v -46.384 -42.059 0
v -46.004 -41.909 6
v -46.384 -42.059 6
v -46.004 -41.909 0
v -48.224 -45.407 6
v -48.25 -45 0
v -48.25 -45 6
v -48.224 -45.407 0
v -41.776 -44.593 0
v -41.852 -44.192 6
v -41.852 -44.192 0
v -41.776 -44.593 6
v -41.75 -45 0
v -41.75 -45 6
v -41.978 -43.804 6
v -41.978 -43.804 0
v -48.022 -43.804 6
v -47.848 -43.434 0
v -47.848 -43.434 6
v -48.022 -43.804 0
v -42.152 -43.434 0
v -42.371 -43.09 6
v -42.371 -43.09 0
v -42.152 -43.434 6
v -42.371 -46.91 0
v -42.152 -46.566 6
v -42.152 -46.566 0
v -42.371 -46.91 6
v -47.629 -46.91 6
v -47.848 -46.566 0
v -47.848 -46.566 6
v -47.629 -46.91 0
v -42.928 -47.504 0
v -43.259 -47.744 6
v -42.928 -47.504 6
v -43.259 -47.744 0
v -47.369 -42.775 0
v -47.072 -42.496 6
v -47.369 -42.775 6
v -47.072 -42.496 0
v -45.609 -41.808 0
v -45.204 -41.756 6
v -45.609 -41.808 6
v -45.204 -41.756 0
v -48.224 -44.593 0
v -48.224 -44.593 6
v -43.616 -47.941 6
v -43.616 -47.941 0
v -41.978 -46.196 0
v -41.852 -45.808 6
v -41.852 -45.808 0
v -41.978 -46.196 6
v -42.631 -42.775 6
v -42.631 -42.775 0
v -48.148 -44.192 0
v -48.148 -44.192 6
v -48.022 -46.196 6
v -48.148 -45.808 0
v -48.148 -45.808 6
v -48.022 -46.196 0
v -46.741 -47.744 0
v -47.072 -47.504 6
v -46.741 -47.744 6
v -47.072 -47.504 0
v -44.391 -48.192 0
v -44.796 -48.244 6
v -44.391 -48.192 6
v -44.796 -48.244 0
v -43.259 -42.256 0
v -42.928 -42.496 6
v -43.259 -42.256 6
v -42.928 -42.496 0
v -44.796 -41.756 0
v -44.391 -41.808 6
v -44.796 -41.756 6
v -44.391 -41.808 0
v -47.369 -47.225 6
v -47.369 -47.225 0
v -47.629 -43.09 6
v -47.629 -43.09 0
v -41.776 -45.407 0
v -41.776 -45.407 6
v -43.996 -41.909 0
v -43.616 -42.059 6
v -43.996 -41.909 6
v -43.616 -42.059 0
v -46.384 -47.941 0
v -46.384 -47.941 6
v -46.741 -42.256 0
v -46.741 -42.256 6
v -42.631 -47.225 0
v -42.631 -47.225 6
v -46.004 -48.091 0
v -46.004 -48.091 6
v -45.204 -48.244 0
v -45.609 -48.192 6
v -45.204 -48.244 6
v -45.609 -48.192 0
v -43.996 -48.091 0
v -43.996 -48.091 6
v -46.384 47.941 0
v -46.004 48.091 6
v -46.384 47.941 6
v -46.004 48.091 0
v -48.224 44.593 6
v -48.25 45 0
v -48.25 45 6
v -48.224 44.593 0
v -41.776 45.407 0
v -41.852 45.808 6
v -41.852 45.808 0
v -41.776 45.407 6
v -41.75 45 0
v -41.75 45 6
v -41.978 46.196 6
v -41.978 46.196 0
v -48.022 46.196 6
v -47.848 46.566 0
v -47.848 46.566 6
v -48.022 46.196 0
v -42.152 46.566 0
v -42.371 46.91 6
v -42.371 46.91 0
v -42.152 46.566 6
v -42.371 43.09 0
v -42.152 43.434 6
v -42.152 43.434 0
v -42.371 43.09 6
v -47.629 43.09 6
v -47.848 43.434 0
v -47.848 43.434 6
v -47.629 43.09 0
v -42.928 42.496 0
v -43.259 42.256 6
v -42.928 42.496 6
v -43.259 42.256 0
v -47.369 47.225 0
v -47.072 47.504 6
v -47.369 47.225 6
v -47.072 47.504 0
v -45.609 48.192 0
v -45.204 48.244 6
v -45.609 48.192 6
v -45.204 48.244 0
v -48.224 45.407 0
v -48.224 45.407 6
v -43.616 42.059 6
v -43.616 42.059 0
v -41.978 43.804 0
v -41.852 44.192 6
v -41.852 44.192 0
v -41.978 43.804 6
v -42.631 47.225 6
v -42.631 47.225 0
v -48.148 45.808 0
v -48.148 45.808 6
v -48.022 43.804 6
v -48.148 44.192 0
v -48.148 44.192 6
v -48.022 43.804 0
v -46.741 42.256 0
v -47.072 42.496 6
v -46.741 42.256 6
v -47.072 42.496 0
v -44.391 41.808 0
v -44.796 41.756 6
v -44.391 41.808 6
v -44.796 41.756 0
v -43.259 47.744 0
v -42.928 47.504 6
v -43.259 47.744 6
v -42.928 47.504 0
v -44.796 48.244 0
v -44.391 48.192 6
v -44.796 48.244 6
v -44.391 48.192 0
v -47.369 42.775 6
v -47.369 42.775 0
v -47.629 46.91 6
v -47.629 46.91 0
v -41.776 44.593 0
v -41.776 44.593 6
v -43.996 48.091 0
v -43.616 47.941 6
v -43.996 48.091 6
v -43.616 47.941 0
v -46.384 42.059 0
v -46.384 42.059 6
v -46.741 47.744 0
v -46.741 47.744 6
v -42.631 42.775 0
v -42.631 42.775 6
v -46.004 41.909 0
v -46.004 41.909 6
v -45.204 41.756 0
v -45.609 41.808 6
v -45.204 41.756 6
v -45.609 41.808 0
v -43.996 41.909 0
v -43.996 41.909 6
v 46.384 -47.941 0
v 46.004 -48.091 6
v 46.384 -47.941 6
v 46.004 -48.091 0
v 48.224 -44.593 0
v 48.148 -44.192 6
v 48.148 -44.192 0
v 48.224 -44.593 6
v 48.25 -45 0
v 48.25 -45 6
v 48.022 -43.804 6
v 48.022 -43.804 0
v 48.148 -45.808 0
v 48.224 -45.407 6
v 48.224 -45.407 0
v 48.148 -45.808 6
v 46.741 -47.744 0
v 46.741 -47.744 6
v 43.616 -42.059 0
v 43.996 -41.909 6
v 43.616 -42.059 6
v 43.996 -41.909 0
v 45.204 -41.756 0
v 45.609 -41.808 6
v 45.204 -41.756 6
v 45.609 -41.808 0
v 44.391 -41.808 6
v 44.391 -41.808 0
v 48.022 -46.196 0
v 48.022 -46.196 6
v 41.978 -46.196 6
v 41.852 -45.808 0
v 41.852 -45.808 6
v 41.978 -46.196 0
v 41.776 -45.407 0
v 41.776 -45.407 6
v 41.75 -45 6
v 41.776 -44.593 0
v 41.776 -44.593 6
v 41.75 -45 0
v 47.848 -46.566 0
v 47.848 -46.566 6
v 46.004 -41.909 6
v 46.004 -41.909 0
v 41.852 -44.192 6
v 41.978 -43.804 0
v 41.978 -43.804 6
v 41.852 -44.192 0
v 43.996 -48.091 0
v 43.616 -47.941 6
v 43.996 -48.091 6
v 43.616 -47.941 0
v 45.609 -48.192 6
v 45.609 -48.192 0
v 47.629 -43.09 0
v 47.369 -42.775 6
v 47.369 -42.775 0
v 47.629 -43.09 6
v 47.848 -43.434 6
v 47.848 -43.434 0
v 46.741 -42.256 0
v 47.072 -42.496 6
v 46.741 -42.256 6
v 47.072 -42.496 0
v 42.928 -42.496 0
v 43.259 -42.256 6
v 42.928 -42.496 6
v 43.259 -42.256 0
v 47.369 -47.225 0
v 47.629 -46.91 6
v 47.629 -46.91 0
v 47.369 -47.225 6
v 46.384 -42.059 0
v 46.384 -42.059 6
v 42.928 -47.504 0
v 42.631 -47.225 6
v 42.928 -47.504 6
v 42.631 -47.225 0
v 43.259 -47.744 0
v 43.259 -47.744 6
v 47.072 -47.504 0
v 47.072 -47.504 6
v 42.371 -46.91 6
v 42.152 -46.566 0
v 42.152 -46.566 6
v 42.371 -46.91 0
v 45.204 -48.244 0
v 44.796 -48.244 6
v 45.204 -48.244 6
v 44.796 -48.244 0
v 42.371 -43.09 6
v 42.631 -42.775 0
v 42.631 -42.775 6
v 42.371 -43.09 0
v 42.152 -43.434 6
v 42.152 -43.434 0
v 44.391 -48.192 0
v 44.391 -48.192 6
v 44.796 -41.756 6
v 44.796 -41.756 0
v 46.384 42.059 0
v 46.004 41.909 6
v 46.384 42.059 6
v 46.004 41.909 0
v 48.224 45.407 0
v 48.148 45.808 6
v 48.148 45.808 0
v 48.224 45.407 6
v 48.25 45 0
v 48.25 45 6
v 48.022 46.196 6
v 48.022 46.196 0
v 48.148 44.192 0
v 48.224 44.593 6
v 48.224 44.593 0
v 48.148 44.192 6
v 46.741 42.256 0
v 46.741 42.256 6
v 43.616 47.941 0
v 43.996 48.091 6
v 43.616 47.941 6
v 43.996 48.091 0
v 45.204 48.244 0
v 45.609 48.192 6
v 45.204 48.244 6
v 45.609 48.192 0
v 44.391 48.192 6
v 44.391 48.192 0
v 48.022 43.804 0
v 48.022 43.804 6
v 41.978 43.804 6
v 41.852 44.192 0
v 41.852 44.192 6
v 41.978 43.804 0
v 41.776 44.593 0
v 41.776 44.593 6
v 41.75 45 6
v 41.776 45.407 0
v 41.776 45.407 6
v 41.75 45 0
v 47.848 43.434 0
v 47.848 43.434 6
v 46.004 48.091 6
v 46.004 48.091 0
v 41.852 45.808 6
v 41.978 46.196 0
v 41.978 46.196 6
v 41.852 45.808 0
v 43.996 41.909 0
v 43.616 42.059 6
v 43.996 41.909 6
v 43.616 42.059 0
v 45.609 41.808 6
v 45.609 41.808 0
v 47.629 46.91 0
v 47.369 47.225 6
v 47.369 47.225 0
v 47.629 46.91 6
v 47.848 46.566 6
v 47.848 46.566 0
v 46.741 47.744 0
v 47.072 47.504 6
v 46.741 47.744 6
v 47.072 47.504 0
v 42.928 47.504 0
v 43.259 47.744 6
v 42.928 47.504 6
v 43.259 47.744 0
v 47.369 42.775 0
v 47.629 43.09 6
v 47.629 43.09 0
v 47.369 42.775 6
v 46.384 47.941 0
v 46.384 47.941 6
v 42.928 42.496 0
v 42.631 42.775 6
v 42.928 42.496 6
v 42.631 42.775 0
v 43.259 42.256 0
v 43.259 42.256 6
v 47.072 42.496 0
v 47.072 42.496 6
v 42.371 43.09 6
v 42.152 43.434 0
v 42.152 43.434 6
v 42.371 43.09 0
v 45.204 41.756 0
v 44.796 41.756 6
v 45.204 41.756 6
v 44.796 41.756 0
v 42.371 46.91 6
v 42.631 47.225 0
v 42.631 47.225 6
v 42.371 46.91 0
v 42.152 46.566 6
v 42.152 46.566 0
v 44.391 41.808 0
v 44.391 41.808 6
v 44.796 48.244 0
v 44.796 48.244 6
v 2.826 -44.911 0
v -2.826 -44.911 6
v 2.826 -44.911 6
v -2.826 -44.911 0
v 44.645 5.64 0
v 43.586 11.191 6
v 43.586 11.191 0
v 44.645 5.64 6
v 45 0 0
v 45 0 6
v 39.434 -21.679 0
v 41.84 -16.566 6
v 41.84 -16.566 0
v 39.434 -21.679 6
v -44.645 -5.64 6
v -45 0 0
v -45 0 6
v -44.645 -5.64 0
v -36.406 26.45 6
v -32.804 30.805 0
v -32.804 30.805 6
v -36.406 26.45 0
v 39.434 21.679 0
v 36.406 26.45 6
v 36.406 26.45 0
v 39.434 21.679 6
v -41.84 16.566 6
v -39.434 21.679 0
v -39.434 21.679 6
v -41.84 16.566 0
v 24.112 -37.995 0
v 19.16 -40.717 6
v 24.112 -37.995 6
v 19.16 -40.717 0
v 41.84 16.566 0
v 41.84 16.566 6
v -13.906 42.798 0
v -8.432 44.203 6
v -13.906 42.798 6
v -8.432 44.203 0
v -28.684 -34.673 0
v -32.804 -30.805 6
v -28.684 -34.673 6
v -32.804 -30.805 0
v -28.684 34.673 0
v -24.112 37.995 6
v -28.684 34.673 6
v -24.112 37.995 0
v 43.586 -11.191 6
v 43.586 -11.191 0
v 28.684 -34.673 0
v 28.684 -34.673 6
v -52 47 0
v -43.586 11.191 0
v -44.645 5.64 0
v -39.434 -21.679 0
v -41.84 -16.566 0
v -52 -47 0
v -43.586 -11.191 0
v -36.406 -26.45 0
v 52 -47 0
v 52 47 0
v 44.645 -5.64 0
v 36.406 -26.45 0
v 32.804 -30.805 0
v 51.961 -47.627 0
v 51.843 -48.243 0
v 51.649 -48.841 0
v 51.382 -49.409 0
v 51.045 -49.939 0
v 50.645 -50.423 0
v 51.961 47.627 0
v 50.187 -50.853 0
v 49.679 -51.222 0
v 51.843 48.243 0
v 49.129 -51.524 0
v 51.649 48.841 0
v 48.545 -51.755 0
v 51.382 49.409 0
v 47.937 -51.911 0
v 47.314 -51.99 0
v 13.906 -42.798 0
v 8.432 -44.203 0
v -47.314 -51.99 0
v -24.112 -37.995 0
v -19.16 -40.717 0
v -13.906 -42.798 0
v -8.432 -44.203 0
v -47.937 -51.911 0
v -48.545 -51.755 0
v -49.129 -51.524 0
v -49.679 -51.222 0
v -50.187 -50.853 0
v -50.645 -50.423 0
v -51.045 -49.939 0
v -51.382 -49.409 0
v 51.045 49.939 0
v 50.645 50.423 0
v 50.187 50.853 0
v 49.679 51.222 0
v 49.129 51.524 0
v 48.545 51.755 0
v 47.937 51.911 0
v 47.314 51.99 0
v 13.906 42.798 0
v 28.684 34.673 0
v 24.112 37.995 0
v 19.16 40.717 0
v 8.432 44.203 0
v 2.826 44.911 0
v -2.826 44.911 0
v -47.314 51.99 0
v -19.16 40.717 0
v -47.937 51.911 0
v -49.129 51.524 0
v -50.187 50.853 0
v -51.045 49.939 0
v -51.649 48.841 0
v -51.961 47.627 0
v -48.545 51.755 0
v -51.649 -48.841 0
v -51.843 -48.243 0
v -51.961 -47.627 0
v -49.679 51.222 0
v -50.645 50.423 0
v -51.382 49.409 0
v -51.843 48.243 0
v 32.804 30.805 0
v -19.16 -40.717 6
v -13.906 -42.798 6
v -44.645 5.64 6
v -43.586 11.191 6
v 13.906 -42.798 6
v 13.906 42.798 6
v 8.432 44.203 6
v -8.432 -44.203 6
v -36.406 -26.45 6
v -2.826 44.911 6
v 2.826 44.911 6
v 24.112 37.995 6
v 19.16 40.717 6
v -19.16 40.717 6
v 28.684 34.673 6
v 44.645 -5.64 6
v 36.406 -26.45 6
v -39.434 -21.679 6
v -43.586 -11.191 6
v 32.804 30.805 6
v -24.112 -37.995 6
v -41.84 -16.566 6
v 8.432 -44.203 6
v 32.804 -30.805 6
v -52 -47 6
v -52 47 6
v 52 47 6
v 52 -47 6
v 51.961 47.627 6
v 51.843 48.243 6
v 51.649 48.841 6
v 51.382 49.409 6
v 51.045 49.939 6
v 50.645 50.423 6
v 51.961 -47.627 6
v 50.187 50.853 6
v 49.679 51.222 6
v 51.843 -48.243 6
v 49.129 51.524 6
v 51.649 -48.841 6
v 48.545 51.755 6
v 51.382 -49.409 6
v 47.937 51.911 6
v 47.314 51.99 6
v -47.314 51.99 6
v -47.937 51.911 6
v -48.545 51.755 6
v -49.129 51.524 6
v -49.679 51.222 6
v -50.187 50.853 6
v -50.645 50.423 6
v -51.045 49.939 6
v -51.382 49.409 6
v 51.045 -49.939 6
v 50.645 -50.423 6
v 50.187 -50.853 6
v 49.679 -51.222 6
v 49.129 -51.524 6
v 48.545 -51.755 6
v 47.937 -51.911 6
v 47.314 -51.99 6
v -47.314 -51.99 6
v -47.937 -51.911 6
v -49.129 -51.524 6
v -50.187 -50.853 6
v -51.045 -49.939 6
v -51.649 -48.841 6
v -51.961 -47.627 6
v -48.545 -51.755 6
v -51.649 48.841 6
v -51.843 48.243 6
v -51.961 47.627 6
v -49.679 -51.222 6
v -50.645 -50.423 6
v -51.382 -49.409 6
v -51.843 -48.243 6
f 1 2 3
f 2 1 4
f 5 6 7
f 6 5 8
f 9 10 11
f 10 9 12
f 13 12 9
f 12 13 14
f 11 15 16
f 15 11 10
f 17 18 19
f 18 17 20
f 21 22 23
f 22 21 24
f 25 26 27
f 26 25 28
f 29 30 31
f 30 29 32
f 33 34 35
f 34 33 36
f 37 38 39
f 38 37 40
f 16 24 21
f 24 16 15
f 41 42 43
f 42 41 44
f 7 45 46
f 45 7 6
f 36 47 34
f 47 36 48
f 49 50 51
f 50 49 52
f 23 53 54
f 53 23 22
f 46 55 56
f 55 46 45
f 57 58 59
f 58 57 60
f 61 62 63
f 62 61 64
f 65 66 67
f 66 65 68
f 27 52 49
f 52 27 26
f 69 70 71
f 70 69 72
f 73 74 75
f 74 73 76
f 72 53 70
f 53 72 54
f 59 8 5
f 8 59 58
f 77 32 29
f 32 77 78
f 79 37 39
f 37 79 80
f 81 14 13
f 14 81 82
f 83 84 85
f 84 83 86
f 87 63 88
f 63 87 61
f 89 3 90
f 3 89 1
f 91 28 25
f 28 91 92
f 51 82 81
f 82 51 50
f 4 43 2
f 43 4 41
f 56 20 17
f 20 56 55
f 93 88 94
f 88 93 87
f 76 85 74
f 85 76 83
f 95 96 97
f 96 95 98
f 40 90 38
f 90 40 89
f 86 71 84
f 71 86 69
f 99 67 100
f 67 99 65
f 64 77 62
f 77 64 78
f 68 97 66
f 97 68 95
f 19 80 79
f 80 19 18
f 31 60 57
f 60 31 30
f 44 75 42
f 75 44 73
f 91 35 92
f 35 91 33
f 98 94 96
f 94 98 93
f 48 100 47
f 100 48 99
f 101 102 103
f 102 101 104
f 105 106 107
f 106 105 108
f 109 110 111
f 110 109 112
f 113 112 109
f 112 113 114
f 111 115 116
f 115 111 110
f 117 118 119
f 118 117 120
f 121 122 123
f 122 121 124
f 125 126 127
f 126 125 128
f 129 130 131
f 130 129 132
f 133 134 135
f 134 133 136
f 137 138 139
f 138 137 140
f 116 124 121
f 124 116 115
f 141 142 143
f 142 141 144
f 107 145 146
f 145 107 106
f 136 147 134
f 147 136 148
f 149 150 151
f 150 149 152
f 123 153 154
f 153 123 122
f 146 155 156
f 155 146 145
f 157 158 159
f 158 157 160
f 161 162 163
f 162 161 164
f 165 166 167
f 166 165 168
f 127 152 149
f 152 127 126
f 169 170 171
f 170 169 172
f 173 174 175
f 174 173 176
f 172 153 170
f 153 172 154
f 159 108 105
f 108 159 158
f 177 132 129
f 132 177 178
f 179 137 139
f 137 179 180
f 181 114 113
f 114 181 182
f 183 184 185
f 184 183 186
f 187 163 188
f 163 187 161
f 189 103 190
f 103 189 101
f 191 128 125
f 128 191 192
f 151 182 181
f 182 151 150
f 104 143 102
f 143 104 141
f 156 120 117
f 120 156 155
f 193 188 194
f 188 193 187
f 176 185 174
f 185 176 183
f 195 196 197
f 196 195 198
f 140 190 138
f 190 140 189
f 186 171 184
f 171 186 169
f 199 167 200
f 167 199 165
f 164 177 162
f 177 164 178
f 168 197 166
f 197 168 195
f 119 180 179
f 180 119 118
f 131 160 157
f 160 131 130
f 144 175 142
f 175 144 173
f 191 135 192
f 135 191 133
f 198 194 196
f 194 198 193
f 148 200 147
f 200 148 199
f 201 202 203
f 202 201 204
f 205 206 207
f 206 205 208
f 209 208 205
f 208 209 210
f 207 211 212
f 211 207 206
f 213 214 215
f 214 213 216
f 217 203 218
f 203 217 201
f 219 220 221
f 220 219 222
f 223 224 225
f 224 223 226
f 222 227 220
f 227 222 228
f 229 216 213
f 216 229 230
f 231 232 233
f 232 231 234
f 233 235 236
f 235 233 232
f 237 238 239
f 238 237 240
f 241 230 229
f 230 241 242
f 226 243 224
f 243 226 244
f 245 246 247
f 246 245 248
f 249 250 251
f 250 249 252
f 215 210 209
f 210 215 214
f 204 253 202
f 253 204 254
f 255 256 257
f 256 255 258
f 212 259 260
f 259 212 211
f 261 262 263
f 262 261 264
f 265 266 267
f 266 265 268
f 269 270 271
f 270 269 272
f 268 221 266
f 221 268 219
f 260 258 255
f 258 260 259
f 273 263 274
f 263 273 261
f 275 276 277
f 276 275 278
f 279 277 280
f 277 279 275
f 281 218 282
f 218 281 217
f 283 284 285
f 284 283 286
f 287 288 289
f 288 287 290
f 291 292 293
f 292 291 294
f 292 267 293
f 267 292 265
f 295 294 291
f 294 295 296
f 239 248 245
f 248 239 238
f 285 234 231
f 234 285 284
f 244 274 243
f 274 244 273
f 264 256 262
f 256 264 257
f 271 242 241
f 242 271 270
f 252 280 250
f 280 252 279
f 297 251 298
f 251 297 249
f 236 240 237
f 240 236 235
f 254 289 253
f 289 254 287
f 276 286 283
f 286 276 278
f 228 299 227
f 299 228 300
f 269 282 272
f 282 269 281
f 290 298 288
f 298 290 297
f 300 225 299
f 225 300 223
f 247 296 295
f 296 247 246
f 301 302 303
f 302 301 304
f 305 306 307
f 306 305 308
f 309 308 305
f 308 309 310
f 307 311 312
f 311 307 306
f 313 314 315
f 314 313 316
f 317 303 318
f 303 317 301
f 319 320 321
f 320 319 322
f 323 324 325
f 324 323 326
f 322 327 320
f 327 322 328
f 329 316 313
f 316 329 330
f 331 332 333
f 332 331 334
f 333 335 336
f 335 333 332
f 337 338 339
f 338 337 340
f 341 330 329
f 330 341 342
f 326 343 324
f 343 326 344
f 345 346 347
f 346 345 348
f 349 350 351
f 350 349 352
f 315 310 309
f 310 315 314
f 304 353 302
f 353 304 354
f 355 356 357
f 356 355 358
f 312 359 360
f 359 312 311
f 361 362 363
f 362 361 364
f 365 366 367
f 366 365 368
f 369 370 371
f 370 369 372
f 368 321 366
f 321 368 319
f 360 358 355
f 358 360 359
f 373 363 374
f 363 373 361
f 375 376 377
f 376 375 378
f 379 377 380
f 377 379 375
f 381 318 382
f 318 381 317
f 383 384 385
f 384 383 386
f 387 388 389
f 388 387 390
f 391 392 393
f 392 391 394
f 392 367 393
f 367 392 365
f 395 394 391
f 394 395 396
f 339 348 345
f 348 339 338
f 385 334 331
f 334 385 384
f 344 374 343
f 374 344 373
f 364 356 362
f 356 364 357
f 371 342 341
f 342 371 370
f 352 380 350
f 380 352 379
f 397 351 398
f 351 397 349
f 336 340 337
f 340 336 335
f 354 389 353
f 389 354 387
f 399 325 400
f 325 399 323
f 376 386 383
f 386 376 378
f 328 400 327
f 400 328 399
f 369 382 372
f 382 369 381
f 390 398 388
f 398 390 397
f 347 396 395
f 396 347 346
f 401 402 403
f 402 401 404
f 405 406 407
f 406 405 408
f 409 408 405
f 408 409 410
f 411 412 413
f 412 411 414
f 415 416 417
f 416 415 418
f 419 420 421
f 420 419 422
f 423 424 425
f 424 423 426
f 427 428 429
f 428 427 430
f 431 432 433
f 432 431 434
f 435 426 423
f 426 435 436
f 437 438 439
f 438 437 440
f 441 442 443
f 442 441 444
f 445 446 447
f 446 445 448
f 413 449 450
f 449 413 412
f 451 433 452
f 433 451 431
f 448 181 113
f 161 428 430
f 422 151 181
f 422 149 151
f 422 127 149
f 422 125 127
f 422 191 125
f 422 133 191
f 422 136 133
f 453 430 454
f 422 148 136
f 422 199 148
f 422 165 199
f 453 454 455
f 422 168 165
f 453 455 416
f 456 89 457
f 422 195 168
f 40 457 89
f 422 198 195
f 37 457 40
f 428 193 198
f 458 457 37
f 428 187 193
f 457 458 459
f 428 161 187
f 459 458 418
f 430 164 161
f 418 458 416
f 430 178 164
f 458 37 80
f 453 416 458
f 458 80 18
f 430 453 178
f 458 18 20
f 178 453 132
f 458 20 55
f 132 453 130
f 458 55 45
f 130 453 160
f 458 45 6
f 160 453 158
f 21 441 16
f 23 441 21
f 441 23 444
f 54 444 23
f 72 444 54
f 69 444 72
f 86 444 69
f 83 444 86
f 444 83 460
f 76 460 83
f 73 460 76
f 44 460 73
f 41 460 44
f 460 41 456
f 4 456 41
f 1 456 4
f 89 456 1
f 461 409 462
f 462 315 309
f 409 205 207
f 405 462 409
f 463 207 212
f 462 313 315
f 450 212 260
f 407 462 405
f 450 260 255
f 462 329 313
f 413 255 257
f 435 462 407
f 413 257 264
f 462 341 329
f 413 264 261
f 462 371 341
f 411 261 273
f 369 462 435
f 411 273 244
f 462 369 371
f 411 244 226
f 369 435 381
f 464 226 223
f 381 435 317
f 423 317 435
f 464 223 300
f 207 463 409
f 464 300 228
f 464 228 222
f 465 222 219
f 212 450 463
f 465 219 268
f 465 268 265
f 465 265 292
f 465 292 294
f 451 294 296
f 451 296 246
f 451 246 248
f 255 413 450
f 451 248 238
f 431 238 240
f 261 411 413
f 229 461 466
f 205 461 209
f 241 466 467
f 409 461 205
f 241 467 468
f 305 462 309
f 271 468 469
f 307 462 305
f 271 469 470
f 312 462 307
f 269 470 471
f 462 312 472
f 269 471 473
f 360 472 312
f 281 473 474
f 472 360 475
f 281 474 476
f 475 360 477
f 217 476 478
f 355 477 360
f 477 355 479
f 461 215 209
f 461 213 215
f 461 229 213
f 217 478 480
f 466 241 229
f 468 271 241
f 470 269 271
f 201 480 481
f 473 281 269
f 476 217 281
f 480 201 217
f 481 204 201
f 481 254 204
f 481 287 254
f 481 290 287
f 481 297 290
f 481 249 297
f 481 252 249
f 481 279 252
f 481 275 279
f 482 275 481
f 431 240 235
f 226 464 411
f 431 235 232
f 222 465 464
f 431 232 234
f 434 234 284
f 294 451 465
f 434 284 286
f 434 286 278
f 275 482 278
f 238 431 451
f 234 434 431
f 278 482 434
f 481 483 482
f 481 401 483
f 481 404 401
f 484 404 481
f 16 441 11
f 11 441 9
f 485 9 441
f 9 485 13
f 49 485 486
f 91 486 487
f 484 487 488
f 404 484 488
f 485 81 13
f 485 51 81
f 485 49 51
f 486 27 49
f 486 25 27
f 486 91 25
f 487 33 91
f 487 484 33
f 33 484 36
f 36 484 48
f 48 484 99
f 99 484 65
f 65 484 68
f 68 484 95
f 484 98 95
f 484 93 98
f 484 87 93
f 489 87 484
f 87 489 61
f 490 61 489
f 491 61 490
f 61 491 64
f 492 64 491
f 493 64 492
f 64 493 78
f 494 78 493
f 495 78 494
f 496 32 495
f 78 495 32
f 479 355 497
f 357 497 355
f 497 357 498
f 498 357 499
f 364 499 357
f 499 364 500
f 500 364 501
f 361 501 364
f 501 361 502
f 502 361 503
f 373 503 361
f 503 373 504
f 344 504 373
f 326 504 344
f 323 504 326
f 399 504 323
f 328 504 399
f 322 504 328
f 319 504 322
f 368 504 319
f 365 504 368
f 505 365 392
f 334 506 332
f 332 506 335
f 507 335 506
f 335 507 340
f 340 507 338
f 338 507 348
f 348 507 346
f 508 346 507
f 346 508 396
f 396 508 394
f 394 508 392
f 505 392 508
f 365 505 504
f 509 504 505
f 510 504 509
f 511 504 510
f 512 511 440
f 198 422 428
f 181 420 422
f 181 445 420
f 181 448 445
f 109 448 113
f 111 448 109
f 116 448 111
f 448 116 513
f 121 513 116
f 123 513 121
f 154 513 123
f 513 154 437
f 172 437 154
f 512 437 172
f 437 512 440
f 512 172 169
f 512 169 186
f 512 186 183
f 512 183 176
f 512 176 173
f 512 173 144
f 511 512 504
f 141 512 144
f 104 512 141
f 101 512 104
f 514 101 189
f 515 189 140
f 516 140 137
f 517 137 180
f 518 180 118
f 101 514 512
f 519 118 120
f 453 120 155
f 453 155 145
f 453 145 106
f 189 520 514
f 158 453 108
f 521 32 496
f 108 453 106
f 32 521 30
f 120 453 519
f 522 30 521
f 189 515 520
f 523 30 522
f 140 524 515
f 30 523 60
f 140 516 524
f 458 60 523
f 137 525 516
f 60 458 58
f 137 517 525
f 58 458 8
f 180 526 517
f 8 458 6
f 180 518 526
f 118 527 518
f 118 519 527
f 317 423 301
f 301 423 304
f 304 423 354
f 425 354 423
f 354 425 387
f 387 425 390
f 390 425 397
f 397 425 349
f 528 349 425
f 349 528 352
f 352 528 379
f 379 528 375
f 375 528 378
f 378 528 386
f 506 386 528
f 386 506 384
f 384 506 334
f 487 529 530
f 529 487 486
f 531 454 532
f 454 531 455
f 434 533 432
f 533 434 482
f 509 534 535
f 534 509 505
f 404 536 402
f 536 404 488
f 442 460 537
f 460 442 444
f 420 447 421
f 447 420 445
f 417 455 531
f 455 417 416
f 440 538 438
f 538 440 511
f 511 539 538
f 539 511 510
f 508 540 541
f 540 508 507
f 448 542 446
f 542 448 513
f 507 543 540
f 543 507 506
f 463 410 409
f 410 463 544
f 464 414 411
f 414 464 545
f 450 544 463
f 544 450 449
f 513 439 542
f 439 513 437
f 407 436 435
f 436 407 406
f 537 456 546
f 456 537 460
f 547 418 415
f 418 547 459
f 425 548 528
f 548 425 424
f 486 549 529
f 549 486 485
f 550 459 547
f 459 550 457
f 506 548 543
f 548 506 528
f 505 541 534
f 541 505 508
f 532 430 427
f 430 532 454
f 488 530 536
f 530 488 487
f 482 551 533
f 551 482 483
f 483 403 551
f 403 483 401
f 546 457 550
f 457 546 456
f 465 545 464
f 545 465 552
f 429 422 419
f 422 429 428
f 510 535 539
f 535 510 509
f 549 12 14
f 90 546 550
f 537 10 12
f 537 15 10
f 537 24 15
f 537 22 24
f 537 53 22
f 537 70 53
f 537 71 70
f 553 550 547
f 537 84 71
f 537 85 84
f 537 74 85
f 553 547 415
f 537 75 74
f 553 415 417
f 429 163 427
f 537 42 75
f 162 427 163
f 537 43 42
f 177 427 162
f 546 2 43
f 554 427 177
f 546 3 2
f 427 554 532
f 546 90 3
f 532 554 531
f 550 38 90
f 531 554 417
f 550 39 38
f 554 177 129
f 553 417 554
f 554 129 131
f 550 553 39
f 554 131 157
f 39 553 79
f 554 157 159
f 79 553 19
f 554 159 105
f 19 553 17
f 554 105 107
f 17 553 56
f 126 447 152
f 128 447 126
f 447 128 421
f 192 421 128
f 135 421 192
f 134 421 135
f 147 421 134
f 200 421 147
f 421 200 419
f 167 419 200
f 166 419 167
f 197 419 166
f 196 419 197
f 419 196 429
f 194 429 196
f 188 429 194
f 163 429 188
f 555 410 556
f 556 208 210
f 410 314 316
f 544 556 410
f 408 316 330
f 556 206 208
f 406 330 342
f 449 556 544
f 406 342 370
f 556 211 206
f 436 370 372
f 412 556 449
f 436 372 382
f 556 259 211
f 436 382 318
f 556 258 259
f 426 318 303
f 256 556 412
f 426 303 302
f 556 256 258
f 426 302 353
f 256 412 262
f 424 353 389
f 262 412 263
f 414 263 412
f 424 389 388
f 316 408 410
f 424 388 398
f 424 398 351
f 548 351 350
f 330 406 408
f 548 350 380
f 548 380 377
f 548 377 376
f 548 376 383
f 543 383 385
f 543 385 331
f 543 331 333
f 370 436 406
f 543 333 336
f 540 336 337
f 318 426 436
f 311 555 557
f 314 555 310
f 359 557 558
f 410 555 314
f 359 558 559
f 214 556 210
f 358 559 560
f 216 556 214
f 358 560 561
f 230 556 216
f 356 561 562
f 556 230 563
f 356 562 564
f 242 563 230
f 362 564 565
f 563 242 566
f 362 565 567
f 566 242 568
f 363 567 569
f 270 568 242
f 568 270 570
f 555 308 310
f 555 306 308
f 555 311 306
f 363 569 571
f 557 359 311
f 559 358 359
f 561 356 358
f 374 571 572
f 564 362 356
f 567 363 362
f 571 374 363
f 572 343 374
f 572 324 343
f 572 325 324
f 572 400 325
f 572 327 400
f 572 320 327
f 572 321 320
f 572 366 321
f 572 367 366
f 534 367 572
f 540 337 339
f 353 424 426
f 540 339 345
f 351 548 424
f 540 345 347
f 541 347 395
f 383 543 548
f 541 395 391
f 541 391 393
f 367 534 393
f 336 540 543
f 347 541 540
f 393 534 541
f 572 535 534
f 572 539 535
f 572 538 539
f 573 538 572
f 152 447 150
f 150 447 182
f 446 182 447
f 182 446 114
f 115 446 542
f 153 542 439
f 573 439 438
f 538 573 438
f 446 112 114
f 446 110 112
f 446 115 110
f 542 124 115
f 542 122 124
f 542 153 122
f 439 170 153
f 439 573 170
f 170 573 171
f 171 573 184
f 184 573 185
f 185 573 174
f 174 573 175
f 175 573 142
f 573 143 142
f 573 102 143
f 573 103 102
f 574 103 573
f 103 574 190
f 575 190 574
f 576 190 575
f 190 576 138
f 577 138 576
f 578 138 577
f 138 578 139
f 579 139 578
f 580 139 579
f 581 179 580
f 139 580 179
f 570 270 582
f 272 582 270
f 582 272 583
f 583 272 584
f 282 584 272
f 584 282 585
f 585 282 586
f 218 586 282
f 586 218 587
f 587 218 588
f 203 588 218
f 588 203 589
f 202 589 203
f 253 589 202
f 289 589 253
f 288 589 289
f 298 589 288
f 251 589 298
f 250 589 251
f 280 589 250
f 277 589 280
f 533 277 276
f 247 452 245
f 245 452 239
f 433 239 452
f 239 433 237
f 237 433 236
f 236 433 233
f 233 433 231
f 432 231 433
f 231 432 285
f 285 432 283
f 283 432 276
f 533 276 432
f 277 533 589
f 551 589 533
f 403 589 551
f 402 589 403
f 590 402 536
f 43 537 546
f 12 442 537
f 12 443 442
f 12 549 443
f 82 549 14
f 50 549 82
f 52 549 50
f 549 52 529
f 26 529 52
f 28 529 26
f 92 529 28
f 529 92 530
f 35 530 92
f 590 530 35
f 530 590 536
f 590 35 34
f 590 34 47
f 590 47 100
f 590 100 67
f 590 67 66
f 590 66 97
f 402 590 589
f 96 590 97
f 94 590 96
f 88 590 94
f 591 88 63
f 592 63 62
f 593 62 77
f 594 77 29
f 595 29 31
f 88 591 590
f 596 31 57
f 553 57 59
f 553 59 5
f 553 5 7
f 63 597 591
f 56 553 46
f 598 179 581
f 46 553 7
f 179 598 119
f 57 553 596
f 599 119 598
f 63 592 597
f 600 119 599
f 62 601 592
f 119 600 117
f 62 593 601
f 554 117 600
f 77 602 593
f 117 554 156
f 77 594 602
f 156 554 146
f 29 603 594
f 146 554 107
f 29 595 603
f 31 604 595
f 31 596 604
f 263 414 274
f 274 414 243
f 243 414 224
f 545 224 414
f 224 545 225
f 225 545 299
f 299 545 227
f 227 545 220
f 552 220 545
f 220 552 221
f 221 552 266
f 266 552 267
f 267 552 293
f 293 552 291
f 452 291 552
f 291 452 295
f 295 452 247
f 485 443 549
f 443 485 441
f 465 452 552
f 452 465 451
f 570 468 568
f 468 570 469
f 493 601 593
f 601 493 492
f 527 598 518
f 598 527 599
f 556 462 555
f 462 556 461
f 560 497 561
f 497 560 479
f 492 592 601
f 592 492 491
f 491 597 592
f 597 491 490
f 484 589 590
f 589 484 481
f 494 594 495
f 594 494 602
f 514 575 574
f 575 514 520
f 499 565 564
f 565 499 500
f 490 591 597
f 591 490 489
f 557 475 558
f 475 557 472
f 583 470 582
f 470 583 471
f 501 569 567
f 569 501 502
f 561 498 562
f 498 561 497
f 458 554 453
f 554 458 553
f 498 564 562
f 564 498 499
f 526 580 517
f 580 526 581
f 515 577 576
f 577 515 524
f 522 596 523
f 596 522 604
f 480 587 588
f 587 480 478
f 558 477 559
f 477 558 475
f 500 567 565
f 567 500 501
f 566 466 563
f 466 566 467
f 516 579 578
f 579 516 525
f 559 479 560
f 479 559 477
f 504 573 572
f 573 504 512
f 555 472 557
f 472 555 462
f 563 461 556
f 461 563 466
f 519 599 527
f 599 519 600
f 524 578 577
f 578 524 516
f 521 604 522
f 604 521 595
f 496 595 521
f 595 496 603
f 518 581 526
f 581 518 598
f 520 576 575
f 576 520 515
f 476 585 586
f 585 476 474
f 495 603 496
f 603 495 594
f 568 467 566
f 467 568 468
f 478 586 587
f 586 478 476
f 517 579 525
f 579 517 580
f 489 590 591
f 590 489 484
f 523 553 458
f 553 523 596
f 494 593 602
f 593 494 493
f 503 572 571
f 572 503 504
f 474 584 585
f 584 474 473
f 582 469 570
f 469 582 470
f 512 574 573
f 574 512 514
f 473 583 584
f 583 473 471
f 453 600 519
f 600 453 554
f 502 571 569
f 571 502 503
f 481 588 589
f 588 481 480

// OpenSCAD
$fn = 50;


difference() {
	union() {
		hull() {
			translate(v = [-47.0000000000, 47.0000000000, 0]) {
				cylinder(h = 6, r = 5);
			}
			translate(v = [47.0000000000, 47.0000000000, 0]) {
				cylinder(h = 6, r = 5);
			}
			translate(v = [-47.0000000000, -47.0000000000, 0]) {
				cylinder(h = 6, r = 5);
			}
			translate(v = [47.0000000000, -47.0000000000, 0]) {
				cylinder(h = 6, r = 5);
			}
		}
	}
	union() {
		#translate(v = [-45.0000000000, -45.0000000000, -100.0000000000]) {
			cylinder(h = 200, r = 3.2500000000);
		}
		#translate(v = [-45.0000000000, 45.0000000000, -100.0000000000]) {
			cylinder(h = 200, r = 3.2500000000);
		}
		#translate(v = [45.0000000000, -45.0000000000, -100.0000000000]) {
			cylinder(h = 200, r = 3.2500000000);
		}
		#translate(v = [45.0000000000, 45.0000000000, -100.0000000000]) {
			cylinder(h = 200, r = 3.2500000000);
		}
		#cylinder(h = 6, r = 45.0000000000);
	}
}
